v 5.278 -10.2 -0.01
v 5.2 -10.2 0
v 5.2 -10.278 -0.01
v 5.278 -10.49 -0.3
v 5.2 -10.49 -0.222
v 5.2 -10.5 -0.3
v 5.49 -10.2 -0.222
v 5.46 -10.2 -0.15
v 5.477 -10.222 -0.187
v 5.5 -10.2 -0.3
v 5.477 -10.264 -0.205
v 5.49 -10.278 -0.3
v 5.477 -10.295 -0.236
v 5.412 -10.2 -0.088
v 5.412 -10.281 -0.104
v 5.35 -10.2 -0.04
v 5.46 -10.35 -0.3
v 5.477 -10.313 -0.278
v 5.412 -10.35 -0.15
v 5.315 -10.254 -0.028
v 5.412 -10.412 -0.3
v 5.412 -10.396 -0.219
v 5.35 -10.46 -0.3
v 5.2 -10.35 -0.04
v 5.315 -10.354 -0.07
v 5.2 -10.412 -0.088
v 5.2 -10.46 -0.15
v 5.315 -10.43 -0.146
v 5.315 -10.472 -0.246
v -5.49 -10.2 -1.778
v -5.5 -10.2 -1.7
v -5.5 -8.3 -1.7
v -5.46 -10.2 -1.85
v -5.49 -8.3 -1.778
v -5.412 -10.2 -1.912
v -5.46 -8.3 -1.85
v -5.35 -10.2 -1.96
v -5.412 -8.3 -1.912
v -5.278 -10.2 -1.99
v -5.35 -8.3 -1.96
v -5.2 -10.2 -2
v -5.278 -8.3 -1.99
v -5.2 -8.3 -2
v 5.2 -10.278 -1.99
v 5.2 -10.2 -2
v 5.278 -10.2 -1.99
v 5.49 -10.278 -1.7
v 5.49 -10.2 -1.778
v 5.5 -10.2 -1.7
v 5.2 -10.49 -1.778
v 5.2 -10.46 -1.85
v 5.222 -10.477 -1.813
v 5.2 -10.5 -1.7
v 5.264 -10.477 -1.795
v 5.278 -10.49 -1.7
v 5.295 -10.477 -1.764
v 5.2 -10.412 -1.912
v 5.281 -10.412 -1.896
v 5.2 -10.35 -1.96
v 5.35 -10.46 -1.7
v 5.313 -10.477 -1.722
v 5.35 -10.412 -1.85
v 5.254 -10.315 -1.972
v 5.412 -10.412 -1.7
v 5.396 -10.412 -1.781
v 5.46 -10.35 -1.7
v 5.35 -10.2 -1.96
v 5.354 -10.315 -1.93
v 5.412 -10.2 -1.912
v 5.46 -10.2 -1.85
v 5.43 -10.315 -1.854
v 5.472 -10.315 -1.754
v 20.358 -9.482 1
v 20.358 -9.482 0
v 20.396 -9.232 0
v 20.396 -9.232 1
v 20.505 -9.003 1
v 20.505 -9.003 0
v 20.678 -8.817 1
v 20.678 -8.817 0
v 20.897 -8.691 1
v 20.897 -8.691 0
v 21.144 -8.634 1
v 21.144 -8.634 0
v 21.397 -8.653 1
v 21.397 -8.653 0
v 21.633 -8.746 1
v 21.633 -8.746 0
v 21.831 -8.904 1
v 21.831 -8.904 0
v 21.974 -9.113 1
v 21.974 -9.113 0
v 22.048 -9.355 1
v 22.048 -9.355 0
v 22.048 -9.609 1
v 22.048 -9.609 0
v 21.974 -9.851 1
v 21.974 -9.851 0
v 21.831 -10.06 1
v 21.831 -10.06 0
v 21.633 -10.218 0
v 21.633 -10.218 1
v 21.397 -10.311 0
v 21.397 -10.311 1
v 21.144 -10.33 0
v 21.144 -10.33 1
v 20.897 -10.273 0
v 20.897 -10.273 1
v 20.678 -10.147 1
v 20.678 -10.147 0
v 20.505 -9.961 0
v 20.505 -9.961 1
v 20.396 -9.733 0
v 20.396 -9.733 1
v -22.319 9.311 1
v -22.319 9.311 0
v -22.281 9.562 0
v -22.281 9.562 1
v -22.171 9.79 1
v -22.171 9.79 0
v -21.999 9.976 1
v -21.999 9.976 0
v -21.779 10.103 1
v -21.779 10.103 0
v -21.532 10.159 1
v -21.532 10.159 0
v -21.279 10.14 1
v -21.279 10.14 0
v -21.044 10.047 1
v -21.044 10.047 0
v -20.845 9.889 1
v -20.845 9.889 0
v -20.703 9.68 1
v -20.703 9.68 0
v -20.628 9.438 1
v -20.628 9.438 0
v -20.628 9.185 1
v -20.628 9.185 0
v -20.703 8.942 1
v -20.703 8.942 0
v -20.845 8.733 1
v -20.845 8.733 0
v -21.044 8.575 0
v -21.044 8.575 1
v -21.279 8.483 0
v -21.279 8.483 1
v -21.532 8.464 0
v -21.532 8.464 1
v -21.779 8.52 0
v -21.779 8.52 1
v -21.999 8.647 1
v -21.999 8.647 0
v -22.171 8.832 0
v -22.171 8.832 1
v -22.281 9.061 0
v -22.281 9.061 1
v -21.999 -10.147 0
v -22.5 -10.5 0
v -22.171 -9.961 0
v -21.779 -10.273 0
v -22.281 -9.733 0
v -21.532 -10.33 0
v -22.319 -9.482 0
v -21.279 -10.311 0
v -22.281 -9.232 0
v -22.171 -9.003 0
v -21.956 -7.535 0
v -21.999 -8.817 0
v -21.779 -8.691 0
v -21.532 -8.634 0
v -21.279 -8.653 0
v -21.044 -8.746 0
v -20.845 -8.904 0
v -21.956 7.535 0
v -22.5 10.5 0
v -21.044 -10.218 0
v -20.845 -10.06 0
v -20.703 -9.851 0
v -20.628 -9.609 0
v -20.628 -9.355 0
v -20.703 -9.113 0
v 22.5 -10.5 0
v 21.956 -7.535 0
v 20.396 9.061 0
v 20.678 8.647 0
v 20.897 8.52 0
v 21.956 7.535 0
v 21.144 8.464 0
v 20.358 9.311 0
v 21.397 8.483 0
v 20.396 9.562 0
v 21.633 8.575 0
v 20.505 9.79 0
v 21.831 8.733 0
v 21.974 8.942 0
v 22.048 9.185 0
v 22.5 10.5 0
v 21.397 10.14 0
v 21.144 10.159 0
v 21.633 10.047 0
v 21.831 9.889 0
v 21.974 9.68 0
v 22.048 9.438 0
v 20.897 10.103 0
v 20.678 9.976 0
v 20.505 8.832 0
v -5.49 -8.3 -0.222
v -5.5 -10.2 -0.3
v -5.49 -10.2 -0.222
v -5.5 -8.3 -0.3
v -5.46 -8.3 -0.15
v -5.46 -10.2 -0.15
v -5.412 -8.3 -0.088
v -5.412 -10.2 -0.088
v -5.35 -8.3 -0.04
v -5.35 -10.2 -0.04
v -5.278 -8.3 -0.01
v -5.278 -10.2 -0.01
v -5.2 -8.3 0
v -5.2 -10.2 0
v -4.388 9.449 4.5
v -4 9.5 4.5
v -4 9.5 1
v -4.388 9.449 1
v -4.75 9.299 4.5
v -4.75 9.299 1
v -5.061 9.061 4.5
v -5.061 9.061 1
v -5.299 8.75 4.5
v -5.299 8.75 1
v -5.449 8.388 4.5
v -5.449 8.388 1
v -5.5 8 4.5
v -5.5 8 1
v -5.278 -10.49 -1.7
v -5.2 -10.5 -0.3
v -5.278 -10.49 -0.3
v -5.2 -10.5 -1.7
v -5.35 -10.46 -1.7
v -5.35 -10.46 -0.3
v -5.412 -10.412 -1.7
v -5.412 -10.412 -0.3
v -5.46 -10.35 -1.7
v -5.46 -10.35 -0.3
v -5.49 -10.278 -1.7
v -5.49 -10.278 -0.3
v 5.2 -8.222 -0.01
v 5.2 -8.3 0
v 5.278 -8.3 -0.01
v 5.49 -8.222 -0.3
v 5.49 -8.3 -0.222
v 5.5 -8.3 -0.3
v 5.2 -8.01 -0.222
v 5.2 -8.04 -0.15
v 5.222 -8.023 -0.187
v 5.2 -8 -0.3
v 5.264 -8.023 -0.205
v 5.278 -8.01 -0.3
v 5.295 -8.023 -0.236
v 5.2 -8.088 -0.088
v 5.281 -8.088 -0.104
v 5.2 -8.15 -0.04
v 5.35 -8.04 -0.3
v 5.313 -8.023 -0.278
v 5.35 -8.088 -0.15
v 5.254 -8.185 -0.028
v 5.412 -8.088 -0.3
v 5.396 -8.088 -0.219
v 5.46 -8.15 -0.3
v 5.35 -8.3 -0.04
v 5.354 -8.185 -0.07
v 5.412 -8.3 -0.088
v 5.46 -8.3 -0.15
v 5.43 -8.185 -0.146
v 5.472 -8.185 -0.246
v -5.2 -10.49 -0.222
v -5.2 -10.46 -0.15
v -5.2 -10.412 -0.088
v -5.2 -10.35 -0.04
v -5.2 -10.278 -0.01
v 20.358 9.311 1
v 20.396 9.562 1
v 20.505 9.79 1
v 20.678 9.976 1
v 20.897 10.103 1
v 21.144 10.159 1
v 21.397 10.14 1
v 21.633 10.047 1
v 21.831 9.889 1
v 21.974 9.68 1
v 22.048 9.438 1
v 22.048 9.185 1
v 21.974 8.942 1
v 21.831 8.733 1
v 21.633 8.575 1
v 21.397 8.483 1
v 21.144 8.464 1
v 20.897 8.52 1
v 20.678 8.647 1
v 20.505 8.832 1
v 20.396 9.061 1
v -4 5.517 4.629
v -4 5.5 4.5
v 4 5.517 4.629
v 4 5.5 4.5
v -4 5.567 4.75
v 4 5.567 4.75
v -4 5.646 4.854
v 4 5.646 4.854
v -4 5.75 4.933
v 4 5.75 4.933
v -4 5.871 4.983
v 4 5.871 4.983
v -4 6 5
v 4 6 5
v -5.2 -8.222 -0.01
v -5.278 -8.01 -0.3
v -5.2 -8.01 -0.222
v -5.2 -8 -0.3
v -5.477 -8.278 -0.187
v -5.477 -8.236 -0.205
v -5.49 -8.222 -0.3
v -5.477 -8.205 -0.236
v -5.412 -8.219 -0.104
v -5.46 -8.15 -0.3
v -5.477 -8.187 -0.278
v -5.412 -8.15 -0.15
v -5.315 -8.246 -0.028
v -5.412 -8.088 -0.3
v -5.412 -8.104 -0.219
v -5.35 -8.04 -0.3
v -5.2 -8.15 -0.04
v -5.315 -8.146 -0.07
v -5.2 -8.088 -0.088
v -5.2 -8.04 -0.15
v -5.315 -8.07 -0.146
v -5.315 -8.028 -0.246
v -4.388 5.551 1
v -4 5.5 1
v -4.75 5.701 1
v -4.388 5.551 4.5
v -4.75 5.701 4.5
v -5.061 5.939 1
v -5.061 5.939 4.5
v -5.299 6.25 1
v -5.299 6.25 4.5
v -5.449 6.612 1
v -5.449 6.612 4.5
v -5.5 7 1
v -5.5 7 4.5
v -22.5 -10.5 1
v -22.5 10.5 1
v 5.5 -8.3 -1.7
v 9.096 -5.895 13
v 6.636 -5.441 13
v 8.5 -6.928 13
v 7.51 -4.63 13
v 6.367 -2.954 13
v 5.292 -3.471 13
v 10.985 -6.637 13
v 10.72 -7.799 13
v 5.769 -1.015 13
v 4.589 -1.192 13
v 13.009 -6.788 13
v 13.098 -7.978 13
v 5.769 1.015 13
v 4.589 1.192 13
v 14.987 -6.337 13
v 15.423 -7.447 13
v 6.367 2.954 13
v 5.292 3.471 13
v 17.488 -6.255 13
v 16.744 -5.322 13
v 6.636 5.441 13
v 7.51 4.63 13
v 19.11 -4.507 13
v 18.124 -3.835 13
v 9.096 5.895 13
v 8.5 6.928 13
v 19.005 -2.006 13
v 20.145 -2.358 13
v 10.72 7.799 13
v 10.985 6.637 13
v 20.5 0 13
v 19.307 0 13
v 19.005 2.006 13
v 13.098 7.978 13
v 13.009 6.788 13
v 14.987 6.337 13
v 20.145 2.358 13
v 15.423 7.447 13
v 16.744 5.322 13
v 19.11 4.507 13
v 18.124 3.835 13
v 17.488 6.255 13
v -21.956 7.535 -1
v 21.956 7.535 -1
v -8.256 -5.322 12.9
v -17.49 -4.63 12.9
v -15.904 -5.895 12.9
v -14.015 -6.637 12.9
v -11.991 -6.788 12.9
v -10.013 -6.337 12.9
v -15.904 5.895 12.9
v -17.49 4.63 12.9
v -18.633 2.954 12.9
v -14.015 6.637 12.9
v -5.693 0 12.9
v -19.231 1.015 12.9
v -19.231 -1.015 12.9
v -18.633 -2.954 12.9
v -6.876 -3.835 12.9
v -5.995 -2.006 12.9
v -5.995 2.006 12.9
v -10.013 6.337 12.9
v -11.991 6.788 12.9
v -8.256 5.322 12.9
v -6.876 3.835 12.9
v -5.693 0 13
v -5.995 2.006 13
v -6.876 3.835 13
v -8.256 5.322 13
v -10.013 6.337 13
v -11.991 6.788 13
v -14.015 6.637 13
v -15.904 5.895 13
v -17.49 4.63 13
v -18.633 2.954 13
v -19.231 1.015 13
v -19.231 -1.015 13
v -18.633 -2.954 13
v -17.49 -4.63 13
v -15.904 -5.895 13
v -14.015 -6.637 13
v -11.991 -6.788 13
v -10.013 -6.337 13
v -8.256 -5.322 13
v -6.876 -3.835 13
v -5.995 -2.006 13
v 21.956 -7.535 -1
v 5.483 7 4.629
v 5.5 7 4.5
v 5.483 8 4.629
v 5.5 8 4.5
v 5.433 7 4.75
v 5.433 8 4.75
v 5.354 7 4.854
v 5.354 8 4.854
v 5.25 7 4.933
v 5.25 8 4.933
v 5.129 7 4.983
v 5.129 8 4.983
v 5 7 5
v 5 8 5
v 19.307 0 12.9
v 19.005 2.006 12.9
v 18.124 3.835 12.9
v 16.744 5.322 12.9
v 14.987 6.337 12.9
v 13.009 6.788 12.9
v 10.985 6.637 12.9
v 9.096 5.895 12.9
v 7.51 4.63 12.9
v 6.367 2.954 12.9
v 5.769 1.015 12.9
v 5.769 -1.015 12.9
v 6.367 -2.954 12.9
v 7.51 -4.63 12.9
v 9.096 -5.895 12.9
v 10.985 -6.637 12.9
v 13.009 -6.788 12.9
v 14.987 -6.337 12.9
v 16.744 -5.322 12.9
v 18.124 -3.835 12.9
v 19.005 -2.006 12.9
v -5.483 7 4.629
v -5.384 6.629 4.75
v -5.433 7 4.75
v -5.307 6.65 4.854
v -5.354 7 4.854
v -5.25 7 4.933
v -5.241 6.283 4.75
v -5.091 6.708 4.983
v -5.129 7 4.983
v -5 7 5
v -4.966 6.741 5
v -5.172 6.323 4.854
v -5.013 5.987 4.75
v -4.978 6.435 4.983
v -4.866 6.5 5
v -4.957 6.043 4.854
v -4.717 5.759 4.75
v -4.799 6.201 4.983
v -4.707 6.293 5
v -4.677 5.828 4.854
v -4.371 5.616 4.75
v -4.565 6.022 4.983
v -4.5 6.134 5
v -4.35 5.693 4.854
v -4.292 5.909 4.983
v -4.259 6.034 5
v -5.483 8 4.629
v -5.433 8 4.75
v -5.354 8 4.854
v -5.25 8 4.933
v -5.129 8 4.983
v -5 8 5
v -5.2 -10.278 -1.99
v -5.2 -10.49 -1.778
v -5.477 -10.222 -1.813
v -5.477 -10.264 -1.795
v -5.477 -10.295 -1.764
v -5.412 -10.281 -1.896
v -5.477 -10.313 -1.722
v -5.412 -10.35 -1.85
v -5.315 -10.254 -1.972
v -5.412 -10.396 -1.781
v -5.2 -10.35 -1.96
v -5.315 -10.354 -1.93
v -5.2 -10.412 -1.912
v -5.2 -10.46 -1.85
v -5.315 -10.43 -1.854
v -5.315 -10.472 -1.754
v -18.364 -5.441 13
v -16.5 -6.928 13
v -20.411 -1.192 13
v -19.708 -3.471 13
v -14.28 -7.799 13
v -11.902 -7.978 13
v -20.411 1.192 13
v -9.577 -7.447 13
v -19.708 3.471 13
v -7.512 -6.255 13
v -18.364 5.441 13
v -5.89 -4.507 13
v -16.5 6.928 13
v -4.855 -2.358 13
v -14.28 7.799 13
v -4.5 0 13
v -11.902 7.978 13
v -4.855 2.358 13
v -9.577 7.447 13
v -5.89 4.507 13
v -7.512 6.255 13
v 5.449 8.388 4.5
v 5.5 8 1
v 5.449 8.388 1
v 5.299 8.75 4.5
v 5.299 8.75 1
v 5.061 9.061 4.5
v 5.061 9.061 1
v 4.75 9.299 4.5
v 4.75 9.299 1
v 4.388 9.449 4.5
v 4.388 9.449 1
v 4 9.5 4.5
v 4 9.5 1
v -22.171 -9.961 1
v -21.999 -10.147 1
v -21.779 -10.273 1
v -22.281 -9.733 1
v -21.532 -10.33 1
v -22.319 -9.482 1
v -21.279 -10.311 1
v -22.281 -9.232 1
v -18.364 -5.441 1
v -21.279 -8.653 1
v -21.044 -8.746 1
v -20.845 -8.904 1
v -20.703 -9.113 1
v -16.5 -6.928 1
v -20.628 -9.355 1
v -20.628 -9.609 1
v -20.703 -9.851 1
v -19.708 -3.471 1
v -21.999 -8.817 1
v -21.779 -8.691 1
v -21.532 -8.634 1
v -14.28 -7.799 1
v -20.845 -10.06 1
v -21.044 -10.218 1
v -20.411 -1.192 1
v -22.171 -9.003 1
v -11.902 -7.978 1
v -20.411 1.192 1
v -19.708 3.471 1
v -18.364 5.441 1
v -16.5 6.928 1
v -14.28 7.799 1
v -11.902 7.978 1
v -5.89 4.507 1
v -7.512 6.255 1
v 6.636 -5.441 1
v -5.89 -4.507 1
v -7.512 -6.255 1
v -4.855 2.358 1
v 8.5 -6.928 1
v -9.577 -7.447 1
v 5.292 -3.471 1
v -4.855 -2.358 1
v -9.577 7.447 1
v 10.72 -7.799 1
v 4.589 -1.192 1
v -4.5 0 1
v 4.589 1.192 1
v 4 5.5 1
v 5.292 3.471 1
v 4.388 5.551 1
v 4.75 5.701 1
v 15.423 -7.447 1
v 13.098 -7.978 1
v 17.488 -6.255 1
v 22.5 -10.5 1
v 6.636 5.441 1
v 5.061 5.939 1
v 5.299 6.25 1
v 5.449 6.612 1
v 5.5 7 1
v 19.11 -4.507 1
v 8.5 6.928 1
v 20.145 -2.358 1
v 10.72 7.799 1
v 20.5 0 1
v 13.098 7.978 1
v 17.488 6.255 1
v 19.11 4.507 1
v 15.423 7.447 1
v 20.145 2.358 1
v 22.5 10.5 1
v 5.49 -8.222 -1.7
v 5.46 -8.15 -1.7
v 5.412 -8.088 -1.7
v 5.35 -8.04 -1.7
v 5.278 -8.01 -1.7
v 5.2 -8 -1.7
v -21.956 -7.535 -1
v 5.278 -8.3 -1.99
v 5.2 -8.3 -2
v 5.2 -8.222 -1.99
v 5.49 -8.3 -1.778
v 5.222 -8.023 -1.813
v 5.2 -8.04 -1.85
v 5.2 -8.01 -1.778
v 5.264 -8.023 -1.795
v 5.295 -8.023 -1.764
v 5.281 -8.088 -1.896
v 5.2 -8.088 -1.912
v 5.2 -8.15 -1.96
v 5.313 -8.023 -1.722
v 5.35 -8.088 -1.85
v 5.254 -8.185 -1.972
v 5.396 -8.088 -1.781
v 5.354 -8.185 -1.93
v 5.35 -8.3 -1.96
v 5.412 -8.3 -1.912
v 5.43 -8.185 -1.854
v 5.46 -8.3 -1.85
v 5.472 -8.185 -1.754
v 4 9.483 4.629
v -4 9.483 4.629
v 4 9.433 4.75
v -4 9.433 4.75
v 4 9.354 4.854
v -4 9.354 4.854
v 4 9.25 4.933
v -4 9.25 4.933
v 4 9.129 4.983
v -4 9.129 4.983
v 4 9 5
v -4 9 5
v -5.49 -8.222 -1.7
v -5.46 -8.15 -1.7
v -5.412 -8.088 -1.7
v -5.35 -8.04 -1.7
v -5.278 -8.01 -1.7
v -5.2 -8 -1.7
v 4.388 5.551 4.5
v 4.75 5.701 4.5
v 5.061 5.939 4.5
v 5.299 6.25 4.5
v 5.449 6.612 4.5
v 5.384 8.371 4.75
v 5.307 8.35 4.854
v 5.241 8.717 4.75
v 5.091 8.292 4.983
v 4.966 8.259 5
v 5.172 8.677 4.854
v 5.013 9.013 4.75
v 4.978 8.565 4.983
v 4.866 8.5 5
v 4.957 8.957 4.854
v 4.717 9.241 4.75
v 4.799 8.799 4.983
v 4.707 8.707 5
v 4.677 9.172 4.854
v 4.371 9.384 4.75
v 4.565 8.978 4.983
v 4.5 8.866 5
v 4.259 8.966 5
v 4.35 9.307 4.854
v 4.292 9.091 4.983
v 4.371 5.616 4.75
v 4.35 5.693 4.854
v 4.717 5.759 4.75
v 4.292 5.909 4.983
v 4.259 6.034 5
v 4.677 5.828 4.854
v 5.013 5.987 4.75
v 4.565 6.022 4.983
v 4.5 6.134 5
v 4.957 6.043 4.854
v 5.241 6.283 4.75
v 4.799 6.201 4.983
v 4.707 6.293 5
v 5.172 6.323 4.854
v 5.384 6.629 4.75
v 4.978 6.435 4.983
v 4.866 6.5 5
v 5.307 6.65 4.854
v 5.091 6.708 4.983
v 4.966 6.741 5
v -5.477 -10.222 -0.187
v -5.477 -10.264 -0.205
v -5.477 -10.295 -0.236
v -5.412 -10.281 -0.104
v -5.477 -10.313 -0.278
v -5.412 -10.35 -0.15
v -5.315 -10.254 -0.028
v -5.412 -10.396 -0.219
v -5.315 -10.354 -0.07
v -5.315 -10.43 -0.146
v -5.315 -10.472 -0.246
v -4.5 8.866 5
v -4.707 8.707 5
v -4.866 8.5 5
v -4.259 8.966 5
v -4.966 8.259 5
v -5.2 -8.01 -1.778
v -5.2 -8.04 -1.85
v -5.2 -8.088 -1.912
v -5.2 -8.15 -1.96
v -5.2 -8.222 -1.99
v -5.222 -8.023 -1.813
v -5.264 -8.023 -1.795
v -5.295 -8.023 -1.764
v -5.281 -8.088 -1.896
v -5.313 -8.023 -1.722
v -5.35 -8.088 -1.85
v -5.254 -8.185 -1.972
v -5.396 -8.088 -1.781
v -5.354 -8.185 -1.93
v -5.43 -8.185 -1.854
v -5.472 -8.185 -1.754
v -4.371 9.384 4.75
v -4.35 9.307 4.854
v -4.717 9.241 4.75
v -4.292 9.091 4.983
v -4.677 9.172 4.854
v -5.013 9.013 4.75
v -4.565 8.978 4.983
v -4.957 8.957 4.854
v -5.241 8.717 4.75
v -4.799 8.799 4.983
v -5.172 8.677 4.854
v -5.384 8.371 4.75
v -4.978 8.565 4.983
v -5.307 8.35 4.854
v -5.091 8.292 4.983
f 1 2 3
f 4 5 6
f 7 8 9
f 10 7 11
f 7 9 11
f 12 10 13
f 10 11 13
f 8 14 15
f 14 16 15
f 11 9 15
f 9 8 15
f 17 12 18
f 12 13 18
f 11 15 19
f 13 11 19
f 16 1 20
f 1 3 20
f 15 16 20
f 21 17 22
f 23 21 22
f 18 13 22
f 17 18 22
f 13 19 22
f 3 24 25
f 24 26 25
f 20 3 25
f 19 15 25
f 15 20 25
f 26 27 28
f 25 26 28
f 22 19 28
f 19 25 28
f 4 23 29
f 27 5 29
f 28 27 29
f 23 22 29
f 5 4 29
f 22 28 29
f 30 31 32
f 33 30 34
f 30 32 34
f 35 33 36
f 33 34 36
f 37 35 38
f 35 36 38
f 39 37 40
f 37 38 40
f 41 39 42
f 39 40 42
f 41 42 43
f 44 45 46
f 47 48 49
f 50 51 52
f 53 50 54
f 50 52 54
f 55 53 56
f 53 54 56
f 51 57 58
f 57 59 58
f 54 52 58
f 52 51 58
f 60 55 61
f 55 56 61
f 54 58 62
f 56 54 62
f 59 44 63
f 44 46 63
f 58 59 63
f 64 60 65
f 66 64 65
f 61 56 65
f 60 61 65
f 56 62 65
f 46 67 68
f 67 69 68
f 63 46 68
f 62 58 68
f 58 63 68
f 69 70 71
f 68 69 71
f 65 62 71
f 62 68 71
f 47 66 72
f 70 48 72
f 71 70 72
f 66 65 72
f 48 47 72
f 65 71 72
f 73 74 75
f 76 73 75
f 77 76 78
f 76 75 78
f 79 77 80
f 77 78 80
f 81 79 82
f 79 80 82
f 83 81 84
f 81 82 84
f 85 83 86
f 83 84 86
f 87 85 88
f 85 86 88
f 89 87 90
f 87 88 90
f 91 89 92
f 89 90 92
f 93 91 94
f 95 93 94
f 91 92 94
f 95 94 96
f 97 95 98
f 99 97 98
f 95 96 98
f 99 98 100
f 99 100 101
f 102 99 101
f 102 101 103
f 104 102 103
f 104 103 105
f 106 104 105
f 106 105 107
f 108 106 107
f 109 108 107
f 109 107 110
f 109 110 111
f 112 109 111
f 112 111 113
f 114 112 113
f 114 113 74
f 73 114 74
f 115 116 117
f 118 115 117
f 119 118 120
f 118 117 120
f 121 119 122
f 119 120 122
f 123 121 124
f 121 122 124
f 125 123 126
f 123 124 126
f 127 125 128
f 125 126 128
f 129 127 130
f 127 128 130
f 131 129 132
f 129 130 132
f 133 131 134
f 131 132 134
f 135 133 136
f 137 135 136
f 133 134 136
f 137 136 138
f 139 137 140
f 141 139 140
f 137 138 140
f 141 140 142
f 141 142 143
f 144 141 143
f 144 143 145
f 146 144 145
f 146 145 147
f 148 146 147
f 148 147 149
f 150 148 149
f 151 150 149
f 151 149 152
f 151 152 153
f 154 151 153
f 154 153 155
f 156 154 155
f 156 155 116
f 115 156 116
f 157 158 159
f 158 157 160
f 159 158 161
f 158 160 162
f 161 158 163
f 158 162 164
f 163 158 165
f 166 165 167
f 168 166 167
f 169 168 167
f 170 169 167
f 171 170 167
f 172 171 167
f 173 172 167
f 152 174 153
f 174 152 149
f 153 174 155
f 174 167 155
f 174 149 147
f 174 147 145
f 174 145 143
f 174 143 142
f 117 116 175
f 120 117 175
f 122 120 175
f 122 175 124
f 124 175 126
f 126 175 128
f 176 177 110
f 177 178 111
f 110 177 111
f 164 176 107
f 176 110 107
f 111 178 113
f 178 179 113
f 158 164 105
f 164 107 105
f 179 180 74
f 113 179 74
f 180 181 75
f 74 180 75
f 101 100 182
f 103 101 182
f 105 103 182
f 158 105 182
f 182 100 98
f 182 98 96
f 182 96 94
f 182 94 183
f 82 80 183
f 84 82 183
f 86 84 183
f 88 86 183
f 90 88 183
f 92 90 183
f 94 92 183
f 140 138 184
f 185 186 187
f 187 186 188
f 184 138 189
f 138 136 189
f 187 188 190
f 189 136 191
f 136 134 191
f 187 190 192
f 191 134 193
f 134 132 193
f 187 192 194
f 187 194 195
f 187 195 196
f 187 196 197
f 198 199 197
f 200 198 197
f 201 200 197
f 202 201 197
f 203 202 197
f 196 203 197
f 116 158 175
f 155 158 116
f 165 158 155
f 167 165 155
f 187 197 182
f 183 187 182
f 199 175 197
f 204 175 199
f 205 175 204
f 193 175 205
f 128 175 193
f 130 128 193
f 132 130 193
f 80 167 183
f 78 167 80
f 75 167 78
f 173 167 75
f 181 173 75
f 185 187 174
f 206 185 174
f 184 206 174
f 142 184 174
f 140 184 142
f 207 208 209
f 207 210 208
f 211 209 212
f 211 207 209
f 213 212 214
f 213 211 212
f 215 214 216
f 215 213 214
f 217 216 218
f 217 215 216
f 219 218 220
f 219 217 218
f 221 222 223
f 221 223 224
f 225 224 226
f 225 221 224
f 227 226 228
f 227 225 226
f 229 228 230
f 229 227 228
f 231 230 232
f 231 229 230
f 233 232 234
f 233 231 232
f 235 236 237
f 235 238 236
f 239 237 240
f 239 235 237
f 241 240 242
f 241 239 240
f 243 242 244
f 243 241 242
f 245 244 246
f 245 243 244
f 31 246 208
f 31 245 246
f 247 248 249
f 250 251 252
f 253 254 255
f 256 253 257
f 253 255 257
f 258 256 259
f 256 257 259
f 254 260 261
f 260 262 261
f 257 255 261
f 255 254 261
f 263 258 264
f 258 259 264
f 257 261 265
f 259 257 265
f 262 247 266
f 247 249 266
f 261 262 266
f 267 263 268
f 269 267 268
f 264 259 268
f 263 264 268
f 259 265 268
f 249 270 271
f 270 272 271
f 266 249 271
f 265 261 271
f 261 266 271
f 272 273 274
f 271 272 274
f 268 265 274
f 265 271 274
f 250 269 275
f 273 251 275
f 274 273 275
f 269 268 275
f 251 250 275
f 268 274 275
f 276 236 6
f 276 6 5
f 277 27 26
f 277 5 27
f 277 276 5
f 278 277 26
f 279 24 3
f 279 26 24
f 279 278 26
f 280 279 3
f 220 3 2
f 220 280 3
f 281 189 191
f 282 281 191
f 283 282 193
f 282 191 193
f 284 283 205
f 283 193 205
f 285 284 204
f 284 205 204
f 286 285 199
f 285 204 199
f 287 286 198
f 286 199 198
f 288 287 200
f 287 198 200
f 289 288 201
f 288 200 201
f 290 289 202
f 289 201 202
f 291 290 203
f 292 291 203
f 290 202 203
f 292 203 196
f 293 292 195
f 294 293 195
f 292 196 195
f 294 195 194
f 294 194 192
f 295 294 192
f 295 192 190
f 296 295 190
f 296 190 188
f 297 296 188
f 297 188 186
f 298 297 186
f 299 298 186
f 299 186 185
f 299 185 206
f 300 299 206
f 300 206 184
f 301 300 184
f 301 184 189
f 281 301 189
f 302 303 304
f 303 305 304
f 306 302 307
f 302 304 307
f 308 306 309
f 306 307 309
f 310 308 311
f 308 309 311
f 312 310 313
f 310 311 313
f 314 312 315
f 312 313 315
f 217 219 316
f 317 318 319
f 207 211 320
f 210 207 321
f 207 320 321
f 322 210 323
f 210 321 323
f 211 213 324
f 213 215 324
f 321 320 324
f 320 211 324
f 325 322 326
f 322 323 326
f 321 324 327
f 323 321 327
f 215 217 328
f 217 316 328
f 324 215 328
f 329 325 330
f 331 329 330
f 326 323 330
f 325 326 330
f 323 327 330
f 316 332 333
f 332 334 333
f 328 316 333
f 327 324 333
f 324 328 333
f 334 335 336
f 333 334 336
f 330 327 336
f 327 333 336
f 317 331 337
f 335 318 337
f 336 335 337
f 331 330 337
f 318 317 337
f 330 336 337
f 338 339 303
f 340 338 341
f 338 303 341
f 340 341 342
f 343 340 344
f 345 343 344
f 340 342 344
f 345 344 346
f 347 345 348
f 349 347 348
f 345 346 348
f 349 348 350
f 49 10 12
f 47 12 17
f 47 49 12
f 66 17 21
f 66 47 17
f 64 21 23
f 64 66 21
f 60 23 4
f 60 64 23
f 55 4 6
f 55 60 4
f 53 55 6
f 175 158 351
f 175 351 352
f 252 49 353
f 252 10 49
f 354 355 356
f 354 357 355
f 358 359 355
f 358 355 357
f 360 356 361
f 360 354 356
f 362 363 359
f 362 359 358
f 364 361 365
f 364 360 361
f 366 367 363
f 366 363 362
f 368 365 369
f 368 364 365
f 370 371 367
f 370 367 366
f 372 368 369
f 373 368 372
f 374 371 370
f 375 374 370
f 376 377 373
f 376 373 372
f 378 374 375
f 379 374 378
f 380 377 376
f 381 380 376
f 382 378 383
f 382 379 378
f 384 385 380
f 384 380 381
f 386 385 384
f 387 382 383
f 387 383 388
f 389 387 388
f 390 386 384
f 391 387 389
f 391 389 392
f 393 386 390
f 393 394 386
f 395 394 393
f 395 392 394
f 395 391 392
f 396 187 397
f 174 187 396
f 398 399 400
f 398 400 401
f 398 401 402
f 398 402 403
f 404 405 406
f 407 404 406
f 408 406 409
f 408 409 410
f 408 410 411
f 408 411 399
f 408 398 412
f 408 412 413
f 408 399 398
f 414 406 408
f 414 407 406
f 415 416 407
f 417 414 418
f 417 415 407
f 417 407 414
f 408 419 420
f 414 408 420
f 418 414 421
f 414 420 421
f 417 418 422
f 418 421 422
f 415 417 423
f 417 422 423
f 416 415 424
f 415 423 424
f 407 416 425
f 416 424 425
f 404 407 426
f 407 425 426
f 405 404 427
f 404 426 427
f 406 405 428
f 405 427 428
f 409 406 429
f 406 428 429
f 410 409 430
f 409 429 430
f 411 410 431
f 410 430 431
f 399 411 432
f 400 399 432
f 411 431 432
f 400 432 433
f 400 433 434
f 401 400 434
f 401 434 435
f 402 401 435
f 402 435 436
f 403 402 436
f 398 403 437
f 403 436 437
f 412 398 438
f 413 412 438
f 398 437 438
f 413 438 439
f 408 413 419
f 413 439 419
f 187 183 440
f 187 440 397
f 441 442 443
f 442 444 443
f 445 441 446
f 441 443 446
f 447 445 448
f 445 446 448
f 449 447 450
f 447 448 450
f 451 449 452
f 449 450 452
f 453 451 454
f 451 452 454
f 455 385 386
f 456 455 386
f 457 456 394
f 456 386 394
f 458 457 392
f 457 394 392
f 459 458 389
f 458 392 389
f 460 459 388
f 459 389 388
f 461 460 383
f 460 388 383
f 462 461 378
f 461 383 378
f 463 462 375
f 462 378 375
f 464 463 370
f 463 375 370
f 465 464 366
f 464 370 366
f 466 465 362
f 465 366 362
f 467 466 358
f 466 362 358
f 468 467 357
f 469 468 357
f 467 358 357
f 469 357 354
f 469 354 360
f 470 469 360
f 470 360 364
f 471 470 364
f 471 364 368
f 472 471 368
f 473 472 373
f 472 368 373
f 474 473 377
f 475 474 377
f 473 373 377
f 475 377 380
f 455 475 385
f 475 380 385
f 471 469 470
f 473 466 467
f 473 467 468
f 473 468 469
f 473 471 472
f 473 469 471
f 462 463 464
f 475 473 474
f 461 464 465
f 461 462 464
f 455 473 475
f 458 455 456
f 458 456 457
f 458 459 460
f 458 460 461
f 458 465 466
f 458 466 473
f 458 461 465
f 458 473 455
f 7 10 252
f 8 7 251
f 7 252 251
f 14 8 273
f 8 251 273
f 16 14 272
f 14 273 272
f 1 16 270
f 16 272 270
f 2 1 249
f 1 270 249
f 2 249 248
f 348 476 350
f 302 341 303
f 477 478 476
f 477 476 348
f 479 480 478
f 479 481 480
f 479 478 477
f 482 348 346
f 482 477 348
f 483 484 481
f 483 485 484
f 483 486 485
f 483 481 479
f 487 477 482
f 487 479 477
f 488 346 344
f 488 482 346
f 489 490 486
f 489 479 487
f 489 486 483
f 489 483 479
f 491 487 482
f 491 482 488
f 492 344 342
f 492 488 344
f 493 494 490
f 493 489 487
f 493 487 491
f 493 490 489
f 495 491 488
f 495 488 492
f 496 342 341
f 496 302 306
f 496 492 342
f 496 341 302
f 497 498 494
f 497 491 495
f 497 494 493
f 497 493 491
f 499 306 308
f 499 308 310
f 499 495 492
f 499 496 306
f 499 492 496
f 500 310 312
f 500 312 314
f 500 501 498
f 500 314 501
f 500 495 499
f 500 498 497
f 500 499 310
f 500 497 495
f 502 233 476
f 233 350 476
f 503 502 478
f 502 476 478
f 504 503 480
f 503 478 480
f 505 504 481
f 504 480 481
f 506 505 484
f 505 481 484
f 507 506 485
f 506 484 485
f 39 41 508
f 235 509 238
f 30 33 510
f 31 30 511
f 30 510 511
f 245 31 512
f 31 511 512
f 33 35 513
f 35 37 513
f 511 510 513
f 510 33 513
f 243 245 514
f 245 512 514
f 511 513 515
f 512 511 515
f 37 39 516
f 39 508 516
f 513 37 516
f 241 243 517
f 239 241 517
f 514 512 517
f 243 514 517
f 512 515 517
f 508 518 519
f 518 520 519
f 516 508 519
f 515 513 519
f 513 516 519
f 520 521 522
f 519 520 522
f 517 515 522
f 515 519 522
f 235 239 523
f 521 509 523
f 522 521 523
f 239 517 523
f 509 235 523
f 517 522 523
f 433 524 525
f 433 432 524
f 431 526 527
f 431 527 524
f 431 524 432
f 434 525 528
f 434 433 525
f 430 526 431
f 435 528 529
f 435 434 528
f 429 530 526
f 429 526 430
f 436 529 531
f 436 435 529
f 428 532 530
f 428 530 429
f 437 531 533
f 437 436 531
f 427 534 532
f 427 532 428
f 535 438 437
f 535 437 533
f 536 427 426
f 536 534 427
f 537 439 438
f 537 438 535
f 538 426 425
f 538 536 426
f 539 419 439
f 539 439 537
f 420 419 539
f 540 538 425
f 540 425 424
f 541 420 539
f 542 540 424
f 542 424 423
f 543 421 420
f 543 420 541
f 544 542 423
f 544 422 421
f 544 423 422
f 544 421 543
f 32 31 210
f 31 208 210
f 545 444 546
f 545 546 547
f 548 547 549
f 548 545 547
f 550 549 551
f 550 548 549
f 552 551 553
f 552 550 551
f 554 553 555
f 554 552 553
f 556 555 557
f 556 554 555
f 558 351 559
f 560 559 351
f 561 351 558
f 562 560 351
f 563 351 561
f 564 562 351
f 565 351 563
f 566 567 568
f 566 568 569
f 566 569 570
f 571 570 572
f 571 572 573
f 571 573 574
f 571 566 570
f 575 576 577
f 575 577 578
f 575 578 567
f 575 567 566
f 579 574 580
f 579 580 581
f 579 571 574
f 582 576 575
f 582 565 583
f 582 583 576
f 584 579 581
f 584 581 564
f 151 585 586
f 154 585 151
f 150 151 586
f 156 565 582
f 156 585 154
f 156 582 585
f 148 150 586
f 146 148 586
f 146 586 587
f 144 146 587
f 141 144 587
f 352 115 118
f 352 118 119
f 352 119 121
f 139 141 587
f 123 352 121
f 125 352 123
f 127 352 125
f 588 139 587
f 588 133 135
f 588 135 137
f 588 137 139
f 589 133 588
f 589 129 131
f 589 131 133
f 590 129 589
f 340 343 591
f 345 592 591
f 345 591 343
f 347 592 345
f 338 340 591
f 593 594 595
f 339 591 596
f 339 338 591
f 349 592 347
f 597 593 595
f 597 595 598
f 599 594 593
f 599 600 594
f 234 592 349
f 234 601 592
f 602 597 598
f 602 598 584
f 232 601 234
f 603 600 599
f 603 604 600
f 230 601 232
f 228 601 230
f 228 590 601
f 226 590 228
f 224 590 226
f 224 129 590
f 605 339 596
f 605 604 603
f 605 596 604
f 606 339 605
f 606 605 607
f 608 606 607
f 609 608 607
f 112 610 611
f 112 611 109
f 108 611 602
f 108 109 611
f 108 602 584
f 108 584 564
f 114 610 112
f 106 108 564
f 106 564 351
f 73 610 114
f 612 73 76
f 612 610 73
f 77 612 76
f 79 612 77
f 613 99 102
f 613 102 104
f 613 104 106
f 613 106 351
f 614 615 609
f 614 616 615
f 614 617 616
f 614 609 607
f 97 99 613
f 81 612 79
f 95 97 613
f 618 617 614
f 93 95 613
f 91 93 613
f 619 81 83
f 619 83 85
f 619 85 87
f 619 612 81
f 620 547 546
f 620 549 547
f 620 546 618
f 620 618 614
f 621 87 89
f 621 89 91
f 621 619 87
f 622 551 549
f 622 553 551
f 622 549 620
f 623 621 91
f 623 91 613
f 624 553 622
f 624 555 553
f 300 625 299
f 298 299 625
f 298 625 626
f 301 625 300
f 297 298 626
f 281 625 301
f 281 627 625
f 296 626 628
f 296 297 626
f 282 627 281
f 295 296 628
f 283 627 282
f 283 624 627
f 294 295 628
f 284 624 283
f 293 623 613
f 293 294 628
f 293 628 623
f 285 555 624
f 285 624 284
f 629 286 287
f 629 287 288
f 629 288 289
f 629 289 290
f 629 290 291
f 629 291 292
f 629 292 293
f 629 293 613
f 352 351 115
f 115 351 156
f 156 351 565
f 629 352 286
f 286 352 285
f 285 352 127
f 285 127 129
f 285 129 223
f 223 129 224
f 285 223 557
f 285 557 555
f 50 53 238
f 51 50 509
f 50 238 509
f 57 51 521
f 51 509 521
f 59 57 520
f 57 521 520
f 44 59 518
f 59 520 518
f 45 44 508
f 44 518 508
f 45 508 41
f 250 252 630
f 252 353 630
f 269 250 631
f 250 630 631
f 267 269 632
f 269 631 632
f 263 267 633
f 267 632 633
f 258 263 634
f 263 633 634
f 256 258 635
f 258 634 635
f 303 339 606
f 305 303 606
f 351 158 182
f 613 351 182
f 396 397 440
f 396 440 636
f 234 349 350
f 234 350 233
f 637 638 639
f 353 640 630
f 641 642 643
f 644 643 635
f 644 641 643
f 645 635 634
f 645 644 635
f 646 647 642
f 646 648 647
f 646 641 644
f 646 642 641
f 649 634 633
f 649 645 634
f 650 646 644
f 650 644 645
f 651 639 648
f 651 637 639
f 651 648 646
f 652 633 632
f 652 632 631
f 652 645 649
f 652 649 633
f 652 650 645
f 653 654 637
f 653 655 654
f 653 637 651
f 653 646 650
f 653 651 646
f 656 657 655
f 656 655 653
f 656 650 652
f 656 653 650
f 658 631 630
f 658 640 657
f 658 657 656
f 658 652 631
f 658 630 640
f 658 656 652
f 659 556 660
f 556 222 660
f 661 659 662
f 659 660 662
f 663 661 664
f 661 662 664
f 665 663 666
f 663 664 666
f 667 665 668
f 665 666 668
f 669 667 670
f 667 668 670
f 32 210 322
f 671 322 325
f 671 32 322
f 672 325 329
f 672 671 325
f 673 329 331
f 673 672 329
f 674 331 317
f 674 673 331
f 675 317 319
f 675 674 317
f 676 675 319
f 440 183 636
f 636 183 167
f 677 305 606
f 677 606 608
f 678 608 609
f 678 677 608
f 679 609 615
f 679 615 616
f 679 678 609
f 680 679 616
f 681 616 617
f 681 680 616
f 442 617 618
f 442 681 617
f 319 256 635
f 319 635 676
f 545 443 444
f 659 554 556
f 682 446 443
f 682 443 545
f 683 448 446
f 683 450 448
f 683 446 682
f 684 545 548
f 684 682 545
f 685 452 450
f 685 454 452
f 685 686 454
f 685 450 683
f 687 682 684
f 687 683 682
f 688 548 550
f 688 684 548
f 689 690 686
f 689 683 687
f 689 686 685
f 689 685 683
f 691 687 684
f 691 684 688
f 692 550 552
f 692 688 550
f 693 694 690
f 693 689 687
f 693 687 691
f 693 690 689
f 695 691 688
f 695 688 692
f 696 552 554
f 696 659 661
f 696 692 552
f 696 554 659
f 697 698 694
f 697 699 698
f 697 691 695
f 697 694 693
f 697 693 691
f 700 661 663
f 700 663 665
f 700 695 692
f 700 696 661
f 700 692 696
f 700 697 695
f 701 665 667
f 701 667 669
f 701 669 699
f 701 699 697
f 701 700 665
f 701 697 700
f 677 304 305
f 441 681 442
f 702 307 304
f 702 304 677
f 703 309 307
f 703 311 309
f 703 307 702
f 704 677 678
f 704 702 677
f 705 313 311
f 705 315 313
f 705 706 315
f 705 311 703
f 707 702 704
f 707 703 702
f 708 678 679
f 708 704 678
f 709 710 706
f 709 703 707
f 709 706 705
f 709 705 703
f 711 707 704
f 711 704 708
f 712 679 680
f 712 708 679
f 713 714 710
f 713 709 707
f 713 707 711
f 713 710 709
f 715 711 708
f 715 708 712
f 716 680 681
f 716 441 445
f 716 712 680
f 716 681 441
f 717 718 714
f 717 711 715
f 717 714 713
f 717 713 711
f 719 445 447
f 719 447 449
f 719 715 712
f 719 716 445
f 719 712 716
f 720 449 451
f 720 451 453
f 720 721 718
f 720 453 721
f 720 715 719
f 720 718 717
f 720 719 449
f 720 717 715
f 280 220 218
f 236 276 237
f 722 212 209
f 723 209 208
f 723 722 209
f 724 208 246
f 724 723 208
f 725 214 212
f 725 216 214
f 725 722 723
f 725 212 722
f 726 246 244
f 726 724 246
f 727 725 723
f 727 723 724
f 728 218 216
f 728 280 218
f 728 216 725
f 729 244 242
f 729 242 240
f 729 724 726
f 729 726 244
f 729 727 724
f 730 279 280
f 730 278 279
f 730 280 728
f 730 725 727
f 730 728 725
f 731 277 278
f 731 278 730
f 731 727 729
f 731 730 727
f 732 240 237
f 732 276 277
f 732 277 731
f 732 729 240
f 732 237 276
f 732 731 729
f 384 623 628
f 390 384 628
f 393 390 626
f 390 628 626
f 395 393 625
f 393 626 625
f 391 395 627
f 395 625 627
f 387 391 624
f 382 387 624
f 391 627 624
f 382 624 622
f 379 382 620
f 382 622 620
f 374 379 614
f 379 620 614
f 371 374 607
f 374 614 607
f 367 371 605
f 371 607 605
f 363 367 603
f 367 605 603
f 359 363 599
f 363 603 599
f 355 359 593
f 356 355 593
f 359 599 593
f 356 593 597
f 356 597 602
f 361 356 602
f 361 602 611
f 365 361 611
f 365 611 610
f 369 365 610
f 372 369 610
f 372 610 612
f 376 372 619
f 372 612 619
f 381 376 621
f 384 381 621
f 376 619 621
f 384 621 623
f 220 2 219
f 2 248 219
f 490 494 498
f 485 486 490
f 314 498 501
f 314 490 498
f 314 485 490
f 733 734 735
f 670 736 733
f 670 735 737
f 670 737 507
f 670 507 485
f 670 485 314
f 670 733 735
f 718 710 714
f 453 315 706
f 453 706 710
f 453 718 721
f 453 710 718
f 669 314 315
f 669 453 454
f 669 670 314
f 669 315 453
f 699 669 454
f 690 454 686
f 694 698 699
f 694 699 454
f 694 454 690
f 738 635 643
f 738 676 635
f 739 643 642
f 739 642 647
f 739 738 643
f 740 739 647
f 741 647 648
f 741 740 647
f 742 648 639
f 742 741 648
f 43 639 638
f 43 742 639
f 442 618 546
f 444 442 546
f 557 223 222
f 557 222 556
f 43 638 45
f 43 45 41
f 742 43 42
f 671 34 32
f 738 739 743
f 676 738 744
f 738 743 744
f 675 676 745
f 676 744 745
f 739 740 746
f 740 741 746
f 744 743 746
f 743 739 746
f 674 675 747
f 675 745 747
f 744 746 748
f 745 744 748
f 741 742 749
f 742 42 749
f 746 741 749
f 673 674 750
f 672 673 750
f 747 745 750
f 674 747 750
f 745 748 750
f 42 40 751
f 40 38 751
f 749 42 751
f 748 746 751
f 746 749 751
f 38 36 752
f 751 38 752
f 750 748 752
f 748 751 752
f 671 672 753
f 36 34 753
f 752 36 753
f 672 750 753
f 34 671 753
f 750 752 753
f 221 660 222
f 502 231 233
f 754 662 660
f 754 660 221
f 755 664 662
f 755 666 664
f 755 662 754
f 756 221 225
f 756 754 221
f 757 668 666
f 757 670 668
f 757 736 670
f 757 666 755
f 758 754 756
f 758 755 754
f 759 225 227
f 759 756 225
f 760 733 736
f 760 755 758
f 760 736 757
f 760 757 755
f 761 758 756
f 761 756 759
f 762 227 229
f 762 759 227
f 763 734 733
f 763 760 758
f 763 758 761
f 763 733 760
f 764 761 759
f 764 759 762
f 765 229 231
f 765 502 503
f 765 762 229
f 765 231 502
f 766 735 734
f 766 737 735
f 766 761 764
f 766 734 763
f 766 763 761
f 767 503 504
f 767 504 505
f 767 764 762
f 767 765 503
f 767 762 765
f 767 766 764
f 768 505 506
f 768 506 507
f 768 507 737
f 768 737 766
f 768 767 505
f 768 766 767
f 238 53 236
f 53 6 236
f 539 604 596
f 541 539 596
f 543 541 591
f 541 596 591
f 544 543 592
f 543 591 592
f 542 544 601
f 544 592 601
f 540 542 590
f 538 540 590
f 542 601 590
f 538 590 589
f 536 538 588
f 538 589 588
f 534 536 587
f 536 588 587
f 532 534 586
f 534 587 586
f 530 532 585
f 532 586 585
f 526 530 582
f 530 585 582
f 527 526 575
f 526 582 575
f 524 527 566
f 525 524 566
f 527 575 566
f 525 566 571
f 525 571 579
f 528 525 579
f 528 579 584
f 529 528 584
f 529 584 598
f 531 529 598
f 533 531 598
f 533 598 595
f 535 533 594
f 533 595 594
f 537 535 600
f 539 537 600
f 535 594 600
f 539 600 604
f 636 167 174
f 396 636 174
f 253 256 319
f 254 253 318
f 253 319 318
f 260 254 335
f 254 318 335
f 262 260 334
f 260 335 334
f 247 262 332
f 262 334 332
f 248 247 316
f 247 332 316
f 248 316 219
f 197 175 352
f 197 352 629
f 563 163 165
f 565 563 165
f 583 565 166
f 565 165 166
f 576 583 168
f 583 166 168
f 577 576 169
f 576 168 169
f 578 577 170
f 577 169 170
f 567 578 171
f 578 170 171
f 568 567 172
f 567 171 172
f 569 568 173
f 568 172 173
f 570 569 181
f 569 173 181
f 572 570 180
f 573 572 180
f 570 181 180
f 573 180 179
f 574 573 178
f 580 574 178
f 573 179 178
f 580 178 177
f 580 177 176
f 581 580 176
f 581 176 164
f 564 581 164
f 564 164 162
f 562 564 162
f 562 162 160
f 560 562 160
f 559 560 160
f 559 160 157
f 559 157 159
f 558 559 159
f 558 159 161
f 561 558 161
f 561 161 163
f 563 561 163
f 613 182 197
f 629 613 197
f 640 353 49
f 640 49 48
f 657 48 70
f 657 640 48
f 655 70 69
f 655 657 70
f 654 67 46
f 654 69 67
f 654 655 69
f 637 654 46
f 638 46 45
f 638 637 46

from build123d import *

# Parameters (mm, degrees)
SKIZZE2_W                       = 45
SKIZZE2_H                       = 21
AUFSATZ_LINEAR_AUSTRAGEN1_DEPTH = 1
SKIZZE3_R                       = 8
AUFSATZ_LINEAR_AUSTRAGEN2_DEPTH = 12
SKIZZE4_R                       = 6.807265198
SCHNITT_LINEAR_AUSTRAGEN1_DEPTH = 0.1
SKIZZE7_W                       = 11
SKIZZE7_H                       = 4
AUFSATZ_LINEAR_AUSTRAGEN3_DEPTH = 4
VERRUNDUNG1_R                   = 1.5
VERRUNDUNG2_R                   = 0.5
DURCHGANGSLOCH_F_R_M1_61_D      = 1.7
SKIZZE10_W                      = 43.911086724
SKIZZE10_H                      = 15.069429202
AUFSATZ_LINEAR_AUSTRAGEN4_DEPTH = 1
SKIZZE11_W                      = 11
SKIZZE11_H                      = 2.5
AUFSATZ_LINEAR_AUSTRAGEN6_DEPTH = 2
VERRUNDUNG5_R                   = 0.3


with BuildPart() as part:
    # Skizze2 → Aufsatz-Linear austragen1 (new body)
    with BuildSketch(Plane.XY):
        Rectangle(SKIZZE2_W, SKIZZE2_H)
    extrude(amount=AUFSATZ_LINEAR_AUSTRAGEN1_DEPTH)

    # Skizze3 → Aufsatz-Linear austragen2 (add)
    with BuildSketch(Plane.XY.offset(1)):
        with Locations((-12.5, 0)):
            Circle(SKIZZE3_R)
        with Locations((12.5, 0)):
            Circle(SKIZZE3_R)
    extrude(amount=AUFSATZ_LINEAR_AUSTRAGEN2_DEPTH)

    # Skizze4 → Schnitt-Linear austragen1 (cut)
    with BuildSketch(Plane.XY.offset(13)):
        with Locations((-12.5, 0)):
            Circle(SKIZZE4_R)
        with Locations((12.5, 0)):
            Circle(SKIZZE4_R)
    extrude(amount=-SCHNITT_LINEAR_AUSTRAGEN1_DEPTH, mode=Mode.SUBTRACT)

    # Skizze7 → Aufsatz-Linear austragen3 (add)
    with BuildSketch(Plane.XY.offset(1)):
        with Locations((0, 7.5)):
            Rectangle(SKIZZE7_W, SKIZZE7_H)
    extrude(amount=AUFSATZ_LINEAR_AUSTRAGEN3_DEPTH)

    # Verrundung1
    verrundung1_edges = [part.edges().sort_by_distance(p)[0] for p in [
        (-5.5, 9.5, 3),
        (-5.5, 5.5, 3),
        (5.5, 5.5, 3),
        (5.5, 9.5, 3),
    ]]
    fillet(verrundung1_edges, radius=VERRUNDUNG1_R)

    # Verrundung2
    verrundung2_edges = [part.edges().sort_by_distance(p)[0] for p in [
        (0, 5.5, 5),
        (-5.5, 7.5, 5),
        (5.5, 7.5, 5),
        (0, 9.5, 5),
        (5.060660172, 9.060660172, 5),
        (5.060660172, 5.939339828, 5),
        (-5.060660172, 9.060660172, 5),
        (-5.060660172, 5.939339828, 5),
    ]]
    fillet(verrundung2_edges, radius=VERRUNDUNG2_R)

    # Durchgangsloch für M1.61 (through all)
    with Locations(Plane.XY.offset(1)):
        with Locations((-21.468583309, 9.311267252), (-21.468583309, -9.482056215), (21.207777042, -9.482056215), (21.207777042, 9.311267252)):
            Hole(DURCHGANGSLOCH_F_R_M1_61_D / 2)

    # Skizze10 → Aufsatz-Linear austragen4 (add)
    with BuildSketch(Plane(origin=(0, 0, 0), x_dir=(-1, 0, 0), z_dir=(0, 0, -1))):
        Rectangle(SKIZZE10_W, SKIZZE10_H)
    extrude(amount=AUFSATZ_LINEAR_AUSTRAGEN4_DEPTH)


with BuildPart() as body_2:
    # Skizze11 → Aufsatz-Linear austragen6 (new body)
    with BuildSketch(Plane(origin=(0, 0, 0), x_dir=(-1, 0, 0), z_dir=(0, 0, -1))):
        with Locations((0, -9.25)):
            Rectangle(SKIZZE11_W, SKIZZE11_H)
    extrude(amount=AUFSATZ_LINEAR_AUSTRAGEN6_DEPTH)

    # Verrundung5
    verrundung5_edges = [body_2.edges().sort_by_distance(p)[0] for p in [
        (5.5, -9.25, -2),
        (0, -10.5, -2),
        (-5.5, -9.25, -2),
        (0, -10.5, 0),
        (5.5, -9.25, 0),
        (0, -8, 0),
        (-5.5, -9.25, 0),
        (0, -8, -2),
        (-5.5, -10.5, -1),
        (5.5, -10.5, -1),
        (5.5, -8, -1),
        (-5.5, -8, -1),
    ]]
    fillet(verrundung5_edges, radius=VERRUNDUNG5_R)


solid = Compound([part.part, body_2.part])
